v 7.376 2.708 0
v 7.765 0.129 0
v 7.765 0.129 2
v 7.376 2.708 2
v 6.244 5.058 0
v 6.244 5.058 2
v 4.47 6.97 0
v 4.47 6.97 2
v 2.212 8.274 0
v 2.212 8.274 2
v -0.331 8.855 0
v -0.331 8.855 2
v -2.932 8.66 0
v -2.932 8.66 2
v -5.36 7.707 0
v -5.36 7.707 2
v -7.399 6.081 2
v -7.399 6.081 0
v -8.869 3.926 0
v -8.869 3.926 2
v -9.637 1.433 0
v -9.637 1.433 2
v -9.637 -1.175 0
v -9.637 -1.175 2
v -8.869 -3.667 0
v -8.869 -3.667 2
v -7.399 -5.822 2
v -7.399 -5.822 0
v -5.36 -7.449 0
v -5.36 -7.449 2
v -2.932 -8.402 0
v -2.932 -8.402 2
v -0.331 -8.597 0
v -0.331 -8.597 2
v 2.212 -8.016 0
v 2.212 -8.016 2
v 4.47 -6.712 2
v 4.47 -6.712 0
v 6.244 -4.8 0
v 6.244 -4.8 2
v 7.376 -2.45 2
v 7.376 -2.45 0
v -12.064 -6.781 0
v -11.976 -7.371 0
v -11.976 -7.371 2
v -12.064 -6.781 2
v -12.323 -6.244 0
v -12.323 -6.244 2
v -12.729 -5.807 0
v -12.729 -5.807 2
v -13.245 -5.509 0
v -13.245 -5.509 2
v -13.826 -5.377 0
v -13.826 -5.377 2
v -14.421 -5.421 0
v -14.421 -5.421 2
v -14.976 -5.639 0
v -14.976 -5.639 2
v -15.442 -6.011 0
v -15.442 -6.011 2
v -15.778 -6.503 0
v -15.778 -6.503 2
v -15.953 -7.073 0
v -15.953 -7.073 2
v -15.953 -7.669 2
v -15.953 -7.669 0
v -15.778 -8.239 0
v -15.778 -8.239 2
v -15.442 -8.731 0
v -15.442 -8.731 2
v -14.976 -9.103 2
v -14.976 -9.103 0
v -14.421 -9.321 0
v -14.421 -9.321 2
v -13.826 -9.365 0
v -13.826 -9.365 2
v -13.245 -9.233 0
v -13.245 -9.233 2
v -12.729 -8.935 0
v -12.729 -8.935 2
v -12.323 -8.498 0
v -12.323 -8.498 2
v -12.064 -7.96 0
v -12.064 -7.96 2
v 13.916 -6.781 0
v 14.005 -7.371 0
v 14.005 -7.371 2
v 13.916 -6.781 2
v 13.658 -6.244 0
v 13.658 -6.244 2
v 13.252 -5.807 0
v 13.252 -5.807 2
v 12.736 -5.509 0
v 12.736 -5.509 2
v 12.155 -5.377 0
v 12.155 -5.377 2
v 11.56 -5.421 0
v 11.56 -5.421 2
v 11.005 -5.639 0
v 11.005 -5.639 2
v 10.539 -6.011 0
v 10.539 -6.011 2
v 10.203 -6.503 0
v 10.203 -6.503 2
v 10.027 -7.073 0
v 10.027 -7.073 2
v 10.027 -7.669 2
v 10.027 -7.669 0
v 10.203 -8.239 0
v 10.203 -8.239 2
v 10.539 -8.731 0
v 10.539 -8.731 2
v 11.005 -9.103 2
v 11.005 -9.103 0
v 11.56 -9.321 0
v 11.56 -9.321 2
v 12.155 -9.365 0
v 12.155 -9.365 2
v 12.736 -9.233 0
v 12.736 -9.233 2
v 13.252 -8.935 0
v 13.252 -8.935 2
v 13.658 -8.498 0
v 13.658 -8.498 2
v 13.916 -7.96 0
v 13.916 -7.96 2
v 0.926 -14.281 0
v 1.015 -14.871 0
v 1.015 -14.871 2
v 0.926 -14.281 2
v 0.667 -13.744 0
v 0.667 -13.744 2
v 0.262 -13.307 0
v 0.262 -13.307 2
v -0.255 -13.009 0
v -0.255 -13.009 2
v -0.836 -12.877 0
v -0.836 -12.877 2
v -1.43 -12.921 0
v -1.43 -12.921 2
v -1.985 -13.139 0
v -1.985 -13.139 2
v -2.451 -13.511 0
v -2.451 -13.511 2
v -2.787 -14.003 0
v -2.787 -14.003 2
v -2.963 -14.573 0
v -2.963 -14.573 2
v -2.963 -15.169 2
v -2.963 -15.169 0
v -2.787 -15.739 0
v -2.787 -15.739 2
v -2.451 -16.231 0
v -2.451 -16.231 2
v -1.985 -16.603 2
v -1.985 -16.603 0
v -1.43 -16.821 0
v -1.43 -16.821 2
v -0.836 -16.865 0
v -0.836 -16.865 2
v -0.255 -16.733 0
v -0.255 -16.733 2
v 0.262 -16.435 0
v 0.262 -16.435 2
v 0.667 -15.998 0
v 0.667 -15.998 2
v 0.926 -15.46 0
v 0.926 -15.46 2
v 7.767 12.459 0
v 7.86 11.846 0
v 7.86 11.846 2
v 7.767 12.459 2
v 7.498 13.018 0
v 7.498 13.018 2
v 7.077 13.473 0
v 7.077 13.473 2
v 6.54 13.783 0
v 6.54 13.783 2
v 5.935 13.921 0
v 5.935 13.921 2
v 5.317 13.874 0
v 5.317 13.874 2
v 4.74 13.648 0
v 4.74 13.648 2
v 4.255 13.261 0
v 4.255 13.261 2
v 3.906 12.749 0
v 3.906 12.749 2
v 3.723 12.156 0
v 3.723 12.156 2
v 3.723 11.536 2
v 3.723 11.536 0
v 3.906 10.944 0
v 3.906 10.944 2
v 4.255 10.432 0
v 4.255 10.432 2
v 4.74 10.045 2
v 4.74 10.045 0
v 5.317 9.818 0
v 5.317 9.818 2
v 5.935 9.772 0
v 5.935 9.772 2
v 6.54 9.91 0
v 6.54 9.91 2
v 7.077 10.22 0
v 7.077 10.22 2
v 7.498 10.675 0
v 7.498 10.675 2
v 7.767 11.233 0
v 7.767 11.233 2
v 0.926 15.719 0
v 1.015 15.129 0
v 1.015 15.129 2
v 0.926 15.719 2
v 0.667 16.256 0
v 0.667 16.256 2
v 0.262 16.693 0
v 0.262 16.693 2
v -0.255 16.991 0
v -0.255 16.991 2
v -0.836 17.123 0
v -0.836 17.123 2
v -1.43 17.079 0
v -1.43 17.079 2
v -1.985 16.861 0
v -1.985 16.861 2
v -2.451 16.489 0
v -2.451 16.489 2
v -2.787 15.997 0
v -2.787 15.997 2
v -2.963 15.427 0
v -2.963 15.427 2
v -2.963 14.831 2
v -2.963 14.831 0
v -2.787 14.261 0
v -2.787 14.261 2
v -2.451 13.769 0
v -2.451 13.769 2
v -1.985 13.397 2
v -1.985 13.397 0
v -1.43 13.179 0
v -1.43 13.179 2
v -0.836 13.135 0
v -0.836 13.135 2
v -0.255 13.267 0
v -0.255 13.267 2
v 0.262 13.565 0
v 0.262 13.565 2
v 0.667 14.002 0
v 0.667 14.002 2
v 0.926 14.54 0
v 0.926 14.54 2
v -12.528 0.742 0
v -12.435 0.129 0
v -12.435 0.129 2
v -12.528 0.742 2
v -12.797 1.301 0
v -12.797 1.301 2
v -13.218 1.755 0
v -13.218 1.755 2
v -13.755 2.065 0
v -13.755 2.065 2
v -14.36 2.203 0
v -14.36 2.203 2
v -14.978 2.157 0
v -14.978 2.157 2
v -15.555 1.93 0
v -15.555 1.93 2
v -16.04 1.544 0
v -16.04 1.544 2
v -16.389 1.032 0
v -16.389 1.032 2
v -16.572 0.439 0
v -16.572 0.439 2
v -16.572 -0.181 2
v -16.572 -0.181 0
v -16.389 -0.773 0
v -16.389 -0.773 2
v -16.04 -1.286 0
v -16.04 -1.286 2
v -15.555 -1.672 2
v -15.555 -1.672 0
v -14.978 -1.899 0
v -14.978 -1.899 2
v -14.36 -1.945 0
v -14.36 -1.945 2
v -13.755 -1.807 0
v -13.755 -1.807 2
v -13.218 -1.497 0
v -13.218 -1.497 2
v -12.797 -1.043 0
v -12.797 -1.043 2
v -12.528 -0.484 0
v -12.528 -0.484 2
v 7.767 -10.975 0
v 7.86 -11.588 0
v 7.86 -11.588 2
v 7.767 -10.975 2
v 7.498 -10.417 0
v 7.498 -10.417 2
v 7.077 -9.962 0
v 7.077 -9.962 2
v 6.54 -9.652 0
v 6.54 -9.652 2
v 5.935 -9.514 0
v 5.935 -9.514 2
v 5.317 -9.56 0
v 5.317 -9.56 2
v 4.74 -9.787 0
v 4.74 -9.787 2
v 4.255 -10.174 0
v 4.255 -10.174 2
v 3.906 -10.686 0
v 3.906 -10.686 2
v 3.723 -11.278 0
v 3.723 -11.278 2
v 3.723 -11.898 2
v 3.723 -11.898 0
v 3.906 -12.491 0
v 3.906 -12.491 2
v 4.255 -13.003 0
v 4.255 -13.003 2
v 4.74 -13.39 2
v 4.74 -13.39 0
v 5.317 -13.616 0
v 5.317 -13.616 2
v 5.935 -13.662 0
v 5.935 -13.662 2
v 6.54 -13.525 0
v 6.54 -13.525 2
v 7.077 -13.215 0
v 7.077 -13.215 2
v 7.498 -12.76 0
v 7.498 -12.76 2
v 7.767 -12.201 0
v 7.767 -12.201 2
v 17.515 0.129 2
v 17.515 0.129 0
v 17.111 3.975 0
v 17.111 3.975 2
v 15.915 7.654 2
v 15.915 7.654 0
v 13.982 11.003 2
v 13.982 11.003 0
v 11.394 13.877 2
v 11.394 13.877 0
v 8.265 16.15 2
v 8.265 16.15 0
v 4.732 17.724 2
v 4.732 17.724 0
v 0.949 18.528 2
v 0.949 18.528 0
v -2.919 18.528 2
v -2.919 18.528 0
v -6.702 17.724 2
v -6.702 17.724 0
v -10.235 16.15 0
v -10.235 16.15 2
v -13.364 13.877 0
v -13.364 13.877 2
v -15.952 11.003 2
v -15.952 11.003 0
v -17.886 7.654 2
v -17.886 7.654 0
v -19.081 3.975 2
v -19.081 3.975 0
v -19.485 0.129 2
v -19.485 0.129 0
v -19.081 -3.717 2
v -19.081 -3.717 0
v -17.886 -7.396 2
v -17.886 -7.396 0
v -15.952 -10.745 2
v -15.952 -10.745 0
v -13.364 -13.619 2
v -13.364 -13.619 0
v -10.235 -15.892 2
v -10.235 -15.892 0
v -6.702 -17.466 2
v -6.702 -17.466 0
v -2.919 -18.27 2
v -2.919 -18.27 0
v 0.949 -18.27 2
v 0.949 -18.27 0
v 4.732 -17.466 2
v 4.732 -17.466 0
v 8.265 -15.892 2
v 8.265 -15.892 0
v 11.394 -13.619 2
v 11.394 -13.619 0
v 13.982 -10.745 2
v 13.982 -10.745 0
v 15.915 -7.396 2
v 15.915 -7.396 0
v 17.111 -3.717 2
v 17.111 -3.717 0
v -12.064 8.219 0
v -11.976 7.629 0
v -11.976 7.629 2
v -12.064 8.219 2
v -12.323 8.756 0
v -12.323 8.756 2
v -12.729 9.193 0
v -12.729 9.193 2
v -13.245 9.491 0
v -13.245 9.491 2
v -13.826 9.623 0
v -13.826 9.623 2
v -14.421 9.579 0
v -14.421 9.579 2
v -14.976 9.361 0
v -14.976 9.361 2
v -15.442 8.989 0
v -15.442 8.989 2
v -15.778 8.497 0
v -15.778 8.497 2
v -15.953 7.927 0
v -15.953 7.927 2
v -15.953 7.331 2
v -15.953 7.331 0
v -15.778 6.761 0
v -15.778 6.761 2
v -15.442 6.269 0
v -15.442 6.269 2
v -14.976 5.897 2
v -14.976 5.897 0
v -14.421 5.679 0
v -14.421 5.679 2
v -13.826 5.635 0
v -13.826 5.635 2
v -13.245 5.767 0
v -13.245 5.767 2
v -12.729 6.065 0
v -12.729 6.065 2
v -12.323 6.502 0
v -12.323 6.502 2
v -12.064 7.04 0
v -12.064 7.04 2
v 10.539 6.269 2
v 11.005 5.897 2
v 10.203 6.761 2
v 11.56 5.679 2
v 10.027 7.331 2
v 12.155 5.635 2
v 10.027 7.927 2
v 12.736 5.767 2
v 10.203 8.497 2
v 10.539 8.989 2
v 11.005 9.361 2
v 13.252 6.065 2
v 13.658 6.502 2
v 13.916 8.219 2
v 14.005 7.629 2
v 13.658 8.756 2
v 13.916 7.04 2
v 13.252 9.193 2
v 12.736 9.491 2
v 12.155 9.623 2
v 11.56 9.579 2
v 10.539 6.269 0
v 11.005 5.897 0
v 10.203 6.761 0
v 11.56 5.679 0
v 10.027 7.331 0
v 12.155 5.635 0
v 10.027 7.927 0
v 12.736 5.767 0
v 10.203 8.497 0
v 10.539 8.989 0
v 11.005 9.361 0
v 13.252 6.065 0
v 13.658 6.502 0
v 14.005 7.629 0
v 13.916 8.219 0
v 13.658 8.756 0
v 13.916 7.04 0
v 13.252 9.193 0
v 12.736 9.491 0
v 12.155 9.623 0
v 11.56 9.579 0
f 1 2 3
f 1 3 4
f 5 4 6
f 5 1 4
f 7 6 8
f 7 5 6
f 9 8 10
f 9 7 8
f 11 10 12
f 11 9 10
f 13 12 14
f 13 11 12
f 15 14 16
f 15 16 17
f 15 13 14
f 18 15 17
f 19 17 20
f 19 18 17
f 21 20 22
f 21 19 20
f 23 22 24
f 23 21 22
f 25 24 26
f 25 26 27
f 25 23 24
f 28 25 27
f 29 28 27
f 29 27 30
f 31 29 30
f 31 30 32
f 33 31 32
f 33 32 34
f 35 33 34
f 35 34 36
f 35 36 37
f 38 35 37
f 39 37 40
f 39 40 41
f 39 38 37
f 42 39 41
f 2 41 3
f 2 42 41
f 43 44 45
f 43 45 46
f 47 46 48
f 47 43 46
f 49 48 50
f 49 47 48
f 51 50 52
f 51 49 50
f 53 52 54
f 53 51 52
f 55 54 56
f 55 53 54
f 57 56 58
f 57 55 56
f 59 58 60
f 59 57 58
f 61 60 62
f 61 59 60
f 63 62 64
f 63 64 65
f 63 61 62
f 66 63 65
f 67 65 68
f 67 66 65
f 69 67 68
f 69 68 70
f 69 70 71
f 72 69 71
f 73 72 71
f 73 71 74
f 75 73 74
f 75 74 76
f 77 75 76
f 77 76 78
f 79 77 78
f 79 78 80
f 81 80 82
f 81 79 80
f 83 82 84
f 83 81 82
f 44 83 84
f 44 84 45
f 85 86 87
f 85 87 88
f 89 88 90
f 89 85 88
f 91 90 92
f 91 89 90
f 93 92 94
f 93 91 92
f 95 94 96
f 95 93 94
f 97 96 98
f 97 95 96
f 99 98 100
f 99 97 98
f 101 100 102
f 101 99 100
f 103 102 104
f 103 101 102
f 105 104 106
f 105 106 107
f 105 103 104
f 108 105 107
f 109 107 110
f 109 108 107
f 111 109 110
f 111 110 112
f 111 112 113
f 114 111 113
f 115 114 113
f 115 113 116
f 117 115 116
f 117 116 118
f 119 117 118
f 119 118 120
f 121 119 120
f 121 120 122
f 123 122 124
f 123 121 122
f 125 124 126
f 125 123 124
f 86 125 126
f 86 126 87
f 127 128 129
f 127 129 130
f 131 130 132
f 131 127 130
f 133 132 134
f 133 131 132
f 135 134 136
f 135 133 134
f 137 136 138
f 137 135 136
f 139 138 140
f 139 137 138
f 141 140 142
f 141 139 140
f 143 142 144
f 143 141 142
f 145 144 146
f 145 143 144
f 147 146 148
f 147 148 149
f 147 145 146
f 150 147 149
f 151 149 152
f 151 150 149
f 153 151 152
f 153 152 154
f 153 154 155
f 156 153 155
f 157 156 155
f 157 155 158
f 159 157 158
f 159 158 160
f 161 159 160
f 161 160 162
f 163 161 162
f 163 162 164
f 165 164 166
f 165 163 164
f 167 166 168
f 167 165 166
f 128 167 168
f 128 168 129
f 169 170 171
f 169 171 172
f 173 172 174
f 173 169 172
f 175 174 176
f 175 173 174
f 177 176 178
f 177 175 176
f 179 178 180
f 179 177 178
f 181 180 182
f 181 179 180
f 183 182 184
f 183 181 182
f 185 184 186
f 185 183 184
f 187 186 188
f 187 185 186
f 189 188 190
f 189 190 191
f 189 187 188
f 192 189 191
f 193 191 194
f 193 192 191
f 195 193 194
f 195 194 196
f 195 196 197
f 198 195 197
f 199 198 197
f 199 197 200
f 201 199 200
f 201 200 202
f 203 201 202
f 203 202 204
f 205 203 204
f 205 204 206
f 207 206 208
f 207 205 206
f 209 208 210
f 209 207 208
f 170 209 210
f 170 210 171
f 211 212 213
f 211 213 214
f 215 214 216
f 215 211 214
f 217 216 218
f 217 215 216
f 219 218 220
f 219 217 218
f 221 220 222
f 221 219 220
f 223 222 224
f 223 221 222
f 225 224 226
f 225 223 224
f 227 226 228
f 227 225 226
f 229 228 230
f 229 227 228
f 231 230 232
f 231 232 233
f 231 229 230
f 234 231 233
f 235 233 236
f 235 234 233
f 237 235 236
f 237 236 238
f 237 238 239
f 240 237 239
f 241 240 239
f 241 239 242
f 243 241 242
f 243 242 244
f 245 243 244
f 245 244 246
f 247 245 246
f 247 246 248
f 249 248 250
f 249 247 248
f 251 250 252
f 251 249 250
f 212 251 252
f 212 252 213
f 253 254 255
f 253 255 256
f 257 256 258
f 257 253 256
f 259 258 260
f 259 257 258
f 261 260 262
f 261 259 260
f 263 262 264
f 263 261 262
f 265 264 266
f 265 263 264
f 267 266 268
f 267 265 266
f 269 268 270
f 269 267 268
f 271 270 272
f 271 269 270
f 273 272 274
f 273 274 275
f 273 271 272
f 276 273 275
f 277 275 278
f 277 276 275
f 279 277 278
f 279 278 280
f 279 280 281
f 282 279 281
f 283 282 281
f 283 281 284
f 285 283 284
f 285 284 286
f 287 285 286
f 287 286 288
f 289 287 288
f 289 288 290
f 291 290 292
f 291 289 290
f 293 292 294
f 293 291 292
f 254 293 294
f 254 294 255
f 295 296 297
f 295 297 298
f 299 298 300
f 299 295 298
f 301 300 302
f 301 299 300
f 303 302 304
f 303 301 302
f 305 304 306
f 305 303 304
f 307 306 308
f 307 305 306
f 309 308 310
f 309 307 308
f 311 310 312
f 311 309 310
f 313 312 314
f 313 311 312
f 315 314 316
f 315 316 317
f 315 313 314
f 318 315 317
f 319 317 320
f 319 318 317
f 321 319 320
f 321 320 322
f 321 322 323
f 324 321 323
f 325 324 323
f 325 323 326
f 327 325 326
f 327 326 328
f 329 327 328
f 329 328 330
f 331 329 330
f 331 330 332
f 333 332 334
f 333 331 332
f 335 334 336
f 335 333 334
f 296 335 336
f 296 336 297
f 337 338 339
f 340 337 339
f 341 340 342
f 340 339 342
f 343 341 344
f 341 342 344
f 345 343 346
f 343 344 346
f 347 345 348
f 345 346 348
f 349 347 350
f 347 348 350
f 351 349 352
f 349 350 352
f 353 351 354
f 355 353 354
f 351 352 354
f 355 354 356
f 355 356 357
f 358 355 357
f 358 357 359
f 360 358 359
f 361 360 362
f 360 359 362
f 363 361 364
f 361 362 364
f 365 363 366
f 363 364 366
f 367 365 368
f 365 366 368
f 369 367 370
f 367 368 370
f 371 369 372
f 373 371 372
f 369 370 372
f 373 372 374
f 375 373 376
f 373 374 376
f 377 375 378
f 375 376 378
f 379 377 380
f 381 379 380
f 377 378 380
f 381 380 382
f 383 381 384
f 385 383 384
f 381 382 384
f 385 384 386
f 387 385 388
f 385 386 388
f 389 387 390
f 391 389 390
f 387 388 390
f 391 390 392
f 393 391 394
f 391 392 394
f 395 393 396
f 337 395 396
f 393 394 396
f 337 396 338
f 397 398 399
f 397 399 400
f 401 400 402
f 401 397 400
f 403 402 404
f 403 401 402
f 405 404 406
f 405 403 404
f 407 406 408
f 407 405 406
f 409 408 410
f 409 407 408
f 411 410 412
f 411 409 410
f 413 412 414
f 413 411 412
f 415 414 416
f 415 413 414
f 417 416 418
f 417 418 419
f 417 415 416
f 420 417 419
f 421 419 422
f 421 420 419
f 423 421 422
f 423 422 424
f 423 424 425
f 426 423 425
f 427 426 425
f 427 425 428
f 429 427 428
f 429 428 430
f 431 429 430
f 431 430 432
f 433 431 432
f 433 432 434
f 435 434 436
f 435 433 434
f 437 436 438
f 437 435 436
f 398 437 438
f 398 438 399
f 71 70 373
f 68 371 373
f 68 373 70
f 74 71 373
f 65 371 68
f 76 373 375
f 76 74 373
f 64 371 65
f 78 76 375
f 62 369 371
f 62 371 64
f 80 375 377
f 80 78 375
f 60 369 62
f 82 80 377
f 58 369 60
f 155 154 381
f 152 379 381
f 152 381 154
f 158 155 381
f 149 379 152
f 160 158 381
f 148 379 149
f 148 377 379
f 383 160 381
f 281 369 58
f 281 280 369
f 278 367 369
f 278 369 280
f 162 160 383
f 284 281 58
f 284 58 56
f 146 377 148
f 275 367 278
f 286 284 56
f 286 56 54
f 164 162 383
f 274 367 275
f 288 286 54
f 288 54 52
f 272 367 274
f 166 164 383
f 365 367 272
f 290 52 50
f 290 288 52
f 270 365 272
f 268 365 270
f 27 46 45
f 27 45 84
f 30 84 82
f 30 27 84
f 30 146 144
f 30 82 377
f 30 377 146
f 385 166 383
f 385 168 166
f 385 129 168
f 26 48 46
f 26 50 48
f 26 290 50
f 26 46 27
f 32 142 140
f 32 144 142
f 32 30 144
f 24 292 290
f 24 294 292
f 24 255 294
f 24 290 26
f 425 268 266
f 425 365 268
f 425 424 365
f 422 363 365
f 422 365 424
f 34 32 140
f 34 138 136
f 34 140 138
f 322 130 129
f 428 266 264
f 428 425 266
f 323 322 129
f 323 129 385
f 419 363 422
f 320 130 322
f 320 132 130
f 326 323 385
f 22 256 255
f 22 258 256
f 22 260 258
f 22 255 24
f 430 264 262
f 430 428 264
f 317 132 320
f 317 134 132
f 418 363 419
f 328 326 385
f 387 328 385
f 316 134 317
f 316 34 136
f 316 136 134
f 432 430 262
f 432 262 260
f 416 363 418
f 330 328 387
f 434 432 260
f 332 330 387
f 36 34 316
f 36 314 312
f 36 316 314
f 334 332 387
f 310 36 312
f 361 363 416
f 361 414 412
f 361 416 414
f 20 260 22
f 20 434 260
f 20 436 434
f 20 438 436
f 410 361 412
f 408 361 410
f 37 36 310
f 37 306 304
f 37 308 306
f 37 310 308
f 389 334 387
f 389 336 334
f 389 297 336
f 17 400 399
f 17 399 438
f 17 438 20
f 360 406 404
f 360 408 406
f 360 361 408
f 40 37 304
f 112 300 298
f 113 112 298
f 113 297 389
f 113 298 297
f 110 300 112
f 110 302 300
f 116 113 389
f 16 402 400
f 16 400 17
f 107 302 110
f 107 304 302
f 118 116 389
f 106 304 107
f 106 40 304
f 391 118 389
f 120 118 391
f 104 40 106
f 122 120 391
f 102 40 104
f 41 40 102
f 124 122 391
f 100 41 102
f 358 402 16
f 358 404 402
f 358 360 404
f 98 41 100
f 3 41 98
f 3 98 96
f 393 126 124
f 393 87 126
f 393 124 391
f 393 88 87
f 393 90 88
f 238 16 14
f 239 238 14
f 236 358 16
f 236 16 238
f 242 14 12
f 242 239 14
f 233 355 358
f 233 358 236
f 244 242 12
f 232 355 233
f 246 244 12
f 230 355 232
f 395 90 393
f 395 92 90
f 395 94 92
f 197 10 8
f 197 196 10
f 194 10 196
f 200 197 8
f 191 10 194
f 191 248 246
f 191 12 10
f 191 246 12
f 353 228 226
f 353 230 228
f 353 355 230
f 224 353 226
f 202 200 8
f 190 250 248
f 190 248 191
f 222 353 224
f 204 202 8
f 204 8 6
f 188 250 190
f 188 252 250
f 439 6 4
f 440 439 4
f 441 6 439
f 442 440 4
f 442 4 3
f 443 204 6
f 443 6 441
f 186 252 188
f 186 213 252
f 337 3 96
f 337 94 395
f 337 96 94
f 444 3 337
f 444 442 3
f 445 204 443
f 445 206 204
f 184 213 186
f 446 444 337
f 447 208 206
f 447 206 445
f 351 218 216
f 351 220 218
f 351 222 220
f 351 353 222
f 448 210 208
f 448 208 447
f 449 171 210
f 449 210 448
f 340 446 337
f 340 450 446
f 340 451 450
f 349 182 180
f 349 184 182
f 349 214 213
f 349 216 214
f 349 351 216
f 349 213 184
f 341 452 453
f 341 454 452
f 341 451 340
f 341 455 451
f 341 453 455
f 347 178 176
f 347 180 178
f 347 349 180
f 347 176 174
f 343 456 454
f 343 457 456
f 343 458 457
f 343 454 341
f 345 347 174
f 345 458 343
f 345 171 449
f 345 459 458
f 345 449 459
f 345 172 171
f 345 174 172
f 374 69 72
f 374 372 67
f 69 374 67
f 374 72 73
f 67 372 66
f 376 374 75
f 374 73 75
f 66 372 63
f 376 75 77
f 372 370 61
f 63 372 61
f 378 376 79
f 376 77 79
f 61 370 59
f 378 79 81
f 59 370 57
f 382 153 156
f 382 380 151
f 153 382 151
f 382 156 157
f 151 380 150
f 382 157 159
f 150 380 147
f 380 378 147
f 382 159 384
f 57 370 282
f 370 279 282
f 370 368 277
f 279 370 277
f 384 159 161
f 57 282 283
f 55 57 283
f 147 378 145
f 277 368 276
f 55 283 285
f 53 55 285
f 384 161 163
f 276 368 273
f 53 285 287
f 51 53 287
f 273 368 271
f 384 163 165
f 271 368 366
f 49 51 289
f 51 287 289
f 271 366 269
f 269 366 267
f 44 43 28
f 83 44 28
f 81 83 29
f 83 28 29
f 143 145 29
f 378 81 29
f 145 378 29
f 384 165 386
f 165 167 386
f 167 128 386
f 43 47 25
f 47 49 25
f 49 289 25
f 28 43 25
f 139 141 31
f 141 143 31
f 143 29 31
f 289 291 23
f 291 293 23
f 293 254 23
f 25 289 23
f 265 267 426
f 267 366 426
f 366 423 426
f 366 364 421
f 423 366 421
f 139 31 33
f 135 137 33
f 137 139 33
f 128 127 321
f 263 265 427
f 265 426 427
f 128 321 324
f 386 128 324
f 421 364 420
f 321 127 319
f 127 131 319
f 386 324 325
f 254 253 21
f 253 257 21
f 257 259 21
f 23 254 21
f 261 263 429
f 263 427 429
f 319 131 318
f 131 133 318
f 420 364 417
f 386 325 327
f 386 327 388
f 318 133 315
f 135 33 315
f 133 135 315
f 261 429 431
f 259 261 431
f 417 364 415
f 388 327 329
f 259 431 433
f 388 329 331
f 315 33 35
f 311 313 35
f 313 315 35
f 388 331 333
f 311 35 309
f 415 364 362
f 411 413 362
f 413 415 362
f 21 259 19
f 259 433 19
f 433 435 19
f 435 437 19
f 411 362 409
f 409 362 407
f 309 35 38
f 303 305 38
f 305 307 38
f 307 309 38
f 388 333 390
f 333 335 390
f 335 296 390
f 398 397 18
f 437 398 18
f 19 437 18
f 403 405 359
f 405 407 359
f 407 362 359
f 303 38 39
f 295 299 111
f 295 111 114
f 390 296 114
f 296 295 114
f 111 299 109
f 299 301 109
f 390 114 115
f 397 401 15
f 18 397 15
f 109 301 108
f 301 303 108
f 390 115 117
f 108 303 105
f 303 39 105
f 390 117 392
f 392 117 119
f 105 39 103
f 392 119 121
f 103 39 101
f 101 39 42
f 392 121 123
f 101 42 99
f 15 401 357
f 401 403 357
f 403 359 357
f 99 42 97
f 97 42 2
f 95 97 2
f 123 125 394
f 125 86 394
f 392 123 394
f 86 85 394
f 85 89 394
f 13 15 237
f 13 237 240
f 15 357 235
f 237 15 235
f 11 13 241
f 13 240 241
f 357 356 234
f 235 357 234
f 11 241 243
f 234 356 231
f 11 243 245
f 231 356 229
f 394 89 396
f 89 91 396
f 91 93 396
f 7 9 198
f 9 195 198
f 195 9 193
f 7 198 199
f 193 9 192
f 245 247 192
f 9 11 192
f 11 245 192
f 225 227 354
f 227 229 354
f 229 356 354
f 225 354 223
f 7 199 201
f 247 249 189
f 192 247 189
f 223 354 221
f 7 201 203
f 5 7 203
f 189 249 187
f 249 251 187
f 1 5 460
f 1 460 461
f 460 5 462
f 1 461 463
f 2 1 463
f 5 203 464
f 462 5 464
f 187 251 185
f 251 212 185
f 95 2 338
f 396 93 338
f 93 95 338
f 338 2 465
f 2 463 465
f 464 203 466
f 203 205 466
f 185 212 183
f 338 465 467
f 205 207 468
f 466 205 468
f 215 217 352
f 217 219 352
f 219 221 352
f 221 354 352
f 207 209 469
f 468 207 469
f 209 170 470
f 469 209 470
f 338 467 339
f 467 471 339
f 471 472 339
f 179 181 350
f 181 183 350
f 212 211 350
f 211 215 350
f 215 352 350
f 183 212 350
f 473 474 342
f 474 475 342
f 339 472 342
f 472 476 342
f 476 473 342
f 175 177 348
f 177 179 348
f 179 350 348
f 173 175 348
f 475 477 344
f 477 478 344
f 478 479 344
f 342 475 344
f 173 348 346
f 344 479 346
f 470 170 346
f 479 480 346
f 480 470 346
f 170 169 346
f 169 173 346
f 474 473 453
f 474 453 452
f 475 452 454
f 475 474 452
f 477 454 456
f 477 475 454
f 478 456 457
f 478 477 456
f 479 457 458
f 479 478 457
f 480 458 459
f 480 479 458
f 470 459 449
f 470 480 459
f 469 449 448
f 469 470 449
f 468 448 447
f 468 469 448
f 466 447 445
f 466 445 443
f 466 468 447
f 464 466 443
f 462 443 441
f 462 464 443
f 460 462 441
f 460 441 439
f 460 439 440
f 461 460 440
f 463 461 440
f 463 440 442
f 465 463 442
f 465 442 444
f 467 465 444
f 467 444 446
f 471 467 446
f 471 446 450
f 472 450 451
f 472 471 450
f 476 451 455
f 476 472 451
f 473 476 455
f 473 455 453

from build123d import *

# Parameters (mm, degrees)
SKETCH_1_R      = 18.5
SKETCH_1_R_2    = 2
SKETCH_1_R_3    = 2.08
SKETCH_1_R_4    = 8.75
EXTRUDE_1_DEPTH = 2


with BuildPart() as part:
    # 草图1 → 凸台-拉伸1 (new body)
    with BuildSketch(Plane.XY):
        with Locations((-0.985220571, 0.129022057)):
            Circle(SKETCH_1_R)
        with Locations((-0.985220571, -14.870977943)):
            Circle(SKETCH_1_R_2, mode=Mode.SUBTRACT)
        with Locations((-13.975601628, -7.370977943)):
            Circle(SKETCH_1_R_2, mode=Mode.SUBTRACT)
        with Locations((-13.975601628, 7.629022057)):
            Circle(SKETCH_1_R_2, mode=Mode.SUBTRACT)
        with Locations((-0.985220571, 15.129022057)):
            Circle(SKETCH_1_R_2, mode=Mode.SUBTRACT)
        with Locations((12.005160486, 7.629022057)):
            Circle(SKETCH_1_R_2, mode=Mode.SUBTRACT)
        with Locations((12.005160486, -7.370977943)):
            Circle(SKETCH_1_R_2, mode=Mode.SUBTRACT)
        with Locations((-14.515220571, 0.129022057)):
            Circle(SKETCH_1_R_3, mode=Mode.SUBTRACT)
        with Locations((5.779779429, 11.84634577)):
            Circle(SKETCH_1_R_3, mode=Mode.SUBTRACT)
        with Locations((5.779779429, -11.588301656)):
            Circle(SKETCH_1_R_3, mode=Mode.SUBTRACT)
        with Locations((-0.985220571, 0.129022057)):
            Circle(SKETCH_1_R_4, mode=Mode.SUBTRACT)
    extrude(amount=EXTRUDE_1_DEPTH)


solid = part.part
